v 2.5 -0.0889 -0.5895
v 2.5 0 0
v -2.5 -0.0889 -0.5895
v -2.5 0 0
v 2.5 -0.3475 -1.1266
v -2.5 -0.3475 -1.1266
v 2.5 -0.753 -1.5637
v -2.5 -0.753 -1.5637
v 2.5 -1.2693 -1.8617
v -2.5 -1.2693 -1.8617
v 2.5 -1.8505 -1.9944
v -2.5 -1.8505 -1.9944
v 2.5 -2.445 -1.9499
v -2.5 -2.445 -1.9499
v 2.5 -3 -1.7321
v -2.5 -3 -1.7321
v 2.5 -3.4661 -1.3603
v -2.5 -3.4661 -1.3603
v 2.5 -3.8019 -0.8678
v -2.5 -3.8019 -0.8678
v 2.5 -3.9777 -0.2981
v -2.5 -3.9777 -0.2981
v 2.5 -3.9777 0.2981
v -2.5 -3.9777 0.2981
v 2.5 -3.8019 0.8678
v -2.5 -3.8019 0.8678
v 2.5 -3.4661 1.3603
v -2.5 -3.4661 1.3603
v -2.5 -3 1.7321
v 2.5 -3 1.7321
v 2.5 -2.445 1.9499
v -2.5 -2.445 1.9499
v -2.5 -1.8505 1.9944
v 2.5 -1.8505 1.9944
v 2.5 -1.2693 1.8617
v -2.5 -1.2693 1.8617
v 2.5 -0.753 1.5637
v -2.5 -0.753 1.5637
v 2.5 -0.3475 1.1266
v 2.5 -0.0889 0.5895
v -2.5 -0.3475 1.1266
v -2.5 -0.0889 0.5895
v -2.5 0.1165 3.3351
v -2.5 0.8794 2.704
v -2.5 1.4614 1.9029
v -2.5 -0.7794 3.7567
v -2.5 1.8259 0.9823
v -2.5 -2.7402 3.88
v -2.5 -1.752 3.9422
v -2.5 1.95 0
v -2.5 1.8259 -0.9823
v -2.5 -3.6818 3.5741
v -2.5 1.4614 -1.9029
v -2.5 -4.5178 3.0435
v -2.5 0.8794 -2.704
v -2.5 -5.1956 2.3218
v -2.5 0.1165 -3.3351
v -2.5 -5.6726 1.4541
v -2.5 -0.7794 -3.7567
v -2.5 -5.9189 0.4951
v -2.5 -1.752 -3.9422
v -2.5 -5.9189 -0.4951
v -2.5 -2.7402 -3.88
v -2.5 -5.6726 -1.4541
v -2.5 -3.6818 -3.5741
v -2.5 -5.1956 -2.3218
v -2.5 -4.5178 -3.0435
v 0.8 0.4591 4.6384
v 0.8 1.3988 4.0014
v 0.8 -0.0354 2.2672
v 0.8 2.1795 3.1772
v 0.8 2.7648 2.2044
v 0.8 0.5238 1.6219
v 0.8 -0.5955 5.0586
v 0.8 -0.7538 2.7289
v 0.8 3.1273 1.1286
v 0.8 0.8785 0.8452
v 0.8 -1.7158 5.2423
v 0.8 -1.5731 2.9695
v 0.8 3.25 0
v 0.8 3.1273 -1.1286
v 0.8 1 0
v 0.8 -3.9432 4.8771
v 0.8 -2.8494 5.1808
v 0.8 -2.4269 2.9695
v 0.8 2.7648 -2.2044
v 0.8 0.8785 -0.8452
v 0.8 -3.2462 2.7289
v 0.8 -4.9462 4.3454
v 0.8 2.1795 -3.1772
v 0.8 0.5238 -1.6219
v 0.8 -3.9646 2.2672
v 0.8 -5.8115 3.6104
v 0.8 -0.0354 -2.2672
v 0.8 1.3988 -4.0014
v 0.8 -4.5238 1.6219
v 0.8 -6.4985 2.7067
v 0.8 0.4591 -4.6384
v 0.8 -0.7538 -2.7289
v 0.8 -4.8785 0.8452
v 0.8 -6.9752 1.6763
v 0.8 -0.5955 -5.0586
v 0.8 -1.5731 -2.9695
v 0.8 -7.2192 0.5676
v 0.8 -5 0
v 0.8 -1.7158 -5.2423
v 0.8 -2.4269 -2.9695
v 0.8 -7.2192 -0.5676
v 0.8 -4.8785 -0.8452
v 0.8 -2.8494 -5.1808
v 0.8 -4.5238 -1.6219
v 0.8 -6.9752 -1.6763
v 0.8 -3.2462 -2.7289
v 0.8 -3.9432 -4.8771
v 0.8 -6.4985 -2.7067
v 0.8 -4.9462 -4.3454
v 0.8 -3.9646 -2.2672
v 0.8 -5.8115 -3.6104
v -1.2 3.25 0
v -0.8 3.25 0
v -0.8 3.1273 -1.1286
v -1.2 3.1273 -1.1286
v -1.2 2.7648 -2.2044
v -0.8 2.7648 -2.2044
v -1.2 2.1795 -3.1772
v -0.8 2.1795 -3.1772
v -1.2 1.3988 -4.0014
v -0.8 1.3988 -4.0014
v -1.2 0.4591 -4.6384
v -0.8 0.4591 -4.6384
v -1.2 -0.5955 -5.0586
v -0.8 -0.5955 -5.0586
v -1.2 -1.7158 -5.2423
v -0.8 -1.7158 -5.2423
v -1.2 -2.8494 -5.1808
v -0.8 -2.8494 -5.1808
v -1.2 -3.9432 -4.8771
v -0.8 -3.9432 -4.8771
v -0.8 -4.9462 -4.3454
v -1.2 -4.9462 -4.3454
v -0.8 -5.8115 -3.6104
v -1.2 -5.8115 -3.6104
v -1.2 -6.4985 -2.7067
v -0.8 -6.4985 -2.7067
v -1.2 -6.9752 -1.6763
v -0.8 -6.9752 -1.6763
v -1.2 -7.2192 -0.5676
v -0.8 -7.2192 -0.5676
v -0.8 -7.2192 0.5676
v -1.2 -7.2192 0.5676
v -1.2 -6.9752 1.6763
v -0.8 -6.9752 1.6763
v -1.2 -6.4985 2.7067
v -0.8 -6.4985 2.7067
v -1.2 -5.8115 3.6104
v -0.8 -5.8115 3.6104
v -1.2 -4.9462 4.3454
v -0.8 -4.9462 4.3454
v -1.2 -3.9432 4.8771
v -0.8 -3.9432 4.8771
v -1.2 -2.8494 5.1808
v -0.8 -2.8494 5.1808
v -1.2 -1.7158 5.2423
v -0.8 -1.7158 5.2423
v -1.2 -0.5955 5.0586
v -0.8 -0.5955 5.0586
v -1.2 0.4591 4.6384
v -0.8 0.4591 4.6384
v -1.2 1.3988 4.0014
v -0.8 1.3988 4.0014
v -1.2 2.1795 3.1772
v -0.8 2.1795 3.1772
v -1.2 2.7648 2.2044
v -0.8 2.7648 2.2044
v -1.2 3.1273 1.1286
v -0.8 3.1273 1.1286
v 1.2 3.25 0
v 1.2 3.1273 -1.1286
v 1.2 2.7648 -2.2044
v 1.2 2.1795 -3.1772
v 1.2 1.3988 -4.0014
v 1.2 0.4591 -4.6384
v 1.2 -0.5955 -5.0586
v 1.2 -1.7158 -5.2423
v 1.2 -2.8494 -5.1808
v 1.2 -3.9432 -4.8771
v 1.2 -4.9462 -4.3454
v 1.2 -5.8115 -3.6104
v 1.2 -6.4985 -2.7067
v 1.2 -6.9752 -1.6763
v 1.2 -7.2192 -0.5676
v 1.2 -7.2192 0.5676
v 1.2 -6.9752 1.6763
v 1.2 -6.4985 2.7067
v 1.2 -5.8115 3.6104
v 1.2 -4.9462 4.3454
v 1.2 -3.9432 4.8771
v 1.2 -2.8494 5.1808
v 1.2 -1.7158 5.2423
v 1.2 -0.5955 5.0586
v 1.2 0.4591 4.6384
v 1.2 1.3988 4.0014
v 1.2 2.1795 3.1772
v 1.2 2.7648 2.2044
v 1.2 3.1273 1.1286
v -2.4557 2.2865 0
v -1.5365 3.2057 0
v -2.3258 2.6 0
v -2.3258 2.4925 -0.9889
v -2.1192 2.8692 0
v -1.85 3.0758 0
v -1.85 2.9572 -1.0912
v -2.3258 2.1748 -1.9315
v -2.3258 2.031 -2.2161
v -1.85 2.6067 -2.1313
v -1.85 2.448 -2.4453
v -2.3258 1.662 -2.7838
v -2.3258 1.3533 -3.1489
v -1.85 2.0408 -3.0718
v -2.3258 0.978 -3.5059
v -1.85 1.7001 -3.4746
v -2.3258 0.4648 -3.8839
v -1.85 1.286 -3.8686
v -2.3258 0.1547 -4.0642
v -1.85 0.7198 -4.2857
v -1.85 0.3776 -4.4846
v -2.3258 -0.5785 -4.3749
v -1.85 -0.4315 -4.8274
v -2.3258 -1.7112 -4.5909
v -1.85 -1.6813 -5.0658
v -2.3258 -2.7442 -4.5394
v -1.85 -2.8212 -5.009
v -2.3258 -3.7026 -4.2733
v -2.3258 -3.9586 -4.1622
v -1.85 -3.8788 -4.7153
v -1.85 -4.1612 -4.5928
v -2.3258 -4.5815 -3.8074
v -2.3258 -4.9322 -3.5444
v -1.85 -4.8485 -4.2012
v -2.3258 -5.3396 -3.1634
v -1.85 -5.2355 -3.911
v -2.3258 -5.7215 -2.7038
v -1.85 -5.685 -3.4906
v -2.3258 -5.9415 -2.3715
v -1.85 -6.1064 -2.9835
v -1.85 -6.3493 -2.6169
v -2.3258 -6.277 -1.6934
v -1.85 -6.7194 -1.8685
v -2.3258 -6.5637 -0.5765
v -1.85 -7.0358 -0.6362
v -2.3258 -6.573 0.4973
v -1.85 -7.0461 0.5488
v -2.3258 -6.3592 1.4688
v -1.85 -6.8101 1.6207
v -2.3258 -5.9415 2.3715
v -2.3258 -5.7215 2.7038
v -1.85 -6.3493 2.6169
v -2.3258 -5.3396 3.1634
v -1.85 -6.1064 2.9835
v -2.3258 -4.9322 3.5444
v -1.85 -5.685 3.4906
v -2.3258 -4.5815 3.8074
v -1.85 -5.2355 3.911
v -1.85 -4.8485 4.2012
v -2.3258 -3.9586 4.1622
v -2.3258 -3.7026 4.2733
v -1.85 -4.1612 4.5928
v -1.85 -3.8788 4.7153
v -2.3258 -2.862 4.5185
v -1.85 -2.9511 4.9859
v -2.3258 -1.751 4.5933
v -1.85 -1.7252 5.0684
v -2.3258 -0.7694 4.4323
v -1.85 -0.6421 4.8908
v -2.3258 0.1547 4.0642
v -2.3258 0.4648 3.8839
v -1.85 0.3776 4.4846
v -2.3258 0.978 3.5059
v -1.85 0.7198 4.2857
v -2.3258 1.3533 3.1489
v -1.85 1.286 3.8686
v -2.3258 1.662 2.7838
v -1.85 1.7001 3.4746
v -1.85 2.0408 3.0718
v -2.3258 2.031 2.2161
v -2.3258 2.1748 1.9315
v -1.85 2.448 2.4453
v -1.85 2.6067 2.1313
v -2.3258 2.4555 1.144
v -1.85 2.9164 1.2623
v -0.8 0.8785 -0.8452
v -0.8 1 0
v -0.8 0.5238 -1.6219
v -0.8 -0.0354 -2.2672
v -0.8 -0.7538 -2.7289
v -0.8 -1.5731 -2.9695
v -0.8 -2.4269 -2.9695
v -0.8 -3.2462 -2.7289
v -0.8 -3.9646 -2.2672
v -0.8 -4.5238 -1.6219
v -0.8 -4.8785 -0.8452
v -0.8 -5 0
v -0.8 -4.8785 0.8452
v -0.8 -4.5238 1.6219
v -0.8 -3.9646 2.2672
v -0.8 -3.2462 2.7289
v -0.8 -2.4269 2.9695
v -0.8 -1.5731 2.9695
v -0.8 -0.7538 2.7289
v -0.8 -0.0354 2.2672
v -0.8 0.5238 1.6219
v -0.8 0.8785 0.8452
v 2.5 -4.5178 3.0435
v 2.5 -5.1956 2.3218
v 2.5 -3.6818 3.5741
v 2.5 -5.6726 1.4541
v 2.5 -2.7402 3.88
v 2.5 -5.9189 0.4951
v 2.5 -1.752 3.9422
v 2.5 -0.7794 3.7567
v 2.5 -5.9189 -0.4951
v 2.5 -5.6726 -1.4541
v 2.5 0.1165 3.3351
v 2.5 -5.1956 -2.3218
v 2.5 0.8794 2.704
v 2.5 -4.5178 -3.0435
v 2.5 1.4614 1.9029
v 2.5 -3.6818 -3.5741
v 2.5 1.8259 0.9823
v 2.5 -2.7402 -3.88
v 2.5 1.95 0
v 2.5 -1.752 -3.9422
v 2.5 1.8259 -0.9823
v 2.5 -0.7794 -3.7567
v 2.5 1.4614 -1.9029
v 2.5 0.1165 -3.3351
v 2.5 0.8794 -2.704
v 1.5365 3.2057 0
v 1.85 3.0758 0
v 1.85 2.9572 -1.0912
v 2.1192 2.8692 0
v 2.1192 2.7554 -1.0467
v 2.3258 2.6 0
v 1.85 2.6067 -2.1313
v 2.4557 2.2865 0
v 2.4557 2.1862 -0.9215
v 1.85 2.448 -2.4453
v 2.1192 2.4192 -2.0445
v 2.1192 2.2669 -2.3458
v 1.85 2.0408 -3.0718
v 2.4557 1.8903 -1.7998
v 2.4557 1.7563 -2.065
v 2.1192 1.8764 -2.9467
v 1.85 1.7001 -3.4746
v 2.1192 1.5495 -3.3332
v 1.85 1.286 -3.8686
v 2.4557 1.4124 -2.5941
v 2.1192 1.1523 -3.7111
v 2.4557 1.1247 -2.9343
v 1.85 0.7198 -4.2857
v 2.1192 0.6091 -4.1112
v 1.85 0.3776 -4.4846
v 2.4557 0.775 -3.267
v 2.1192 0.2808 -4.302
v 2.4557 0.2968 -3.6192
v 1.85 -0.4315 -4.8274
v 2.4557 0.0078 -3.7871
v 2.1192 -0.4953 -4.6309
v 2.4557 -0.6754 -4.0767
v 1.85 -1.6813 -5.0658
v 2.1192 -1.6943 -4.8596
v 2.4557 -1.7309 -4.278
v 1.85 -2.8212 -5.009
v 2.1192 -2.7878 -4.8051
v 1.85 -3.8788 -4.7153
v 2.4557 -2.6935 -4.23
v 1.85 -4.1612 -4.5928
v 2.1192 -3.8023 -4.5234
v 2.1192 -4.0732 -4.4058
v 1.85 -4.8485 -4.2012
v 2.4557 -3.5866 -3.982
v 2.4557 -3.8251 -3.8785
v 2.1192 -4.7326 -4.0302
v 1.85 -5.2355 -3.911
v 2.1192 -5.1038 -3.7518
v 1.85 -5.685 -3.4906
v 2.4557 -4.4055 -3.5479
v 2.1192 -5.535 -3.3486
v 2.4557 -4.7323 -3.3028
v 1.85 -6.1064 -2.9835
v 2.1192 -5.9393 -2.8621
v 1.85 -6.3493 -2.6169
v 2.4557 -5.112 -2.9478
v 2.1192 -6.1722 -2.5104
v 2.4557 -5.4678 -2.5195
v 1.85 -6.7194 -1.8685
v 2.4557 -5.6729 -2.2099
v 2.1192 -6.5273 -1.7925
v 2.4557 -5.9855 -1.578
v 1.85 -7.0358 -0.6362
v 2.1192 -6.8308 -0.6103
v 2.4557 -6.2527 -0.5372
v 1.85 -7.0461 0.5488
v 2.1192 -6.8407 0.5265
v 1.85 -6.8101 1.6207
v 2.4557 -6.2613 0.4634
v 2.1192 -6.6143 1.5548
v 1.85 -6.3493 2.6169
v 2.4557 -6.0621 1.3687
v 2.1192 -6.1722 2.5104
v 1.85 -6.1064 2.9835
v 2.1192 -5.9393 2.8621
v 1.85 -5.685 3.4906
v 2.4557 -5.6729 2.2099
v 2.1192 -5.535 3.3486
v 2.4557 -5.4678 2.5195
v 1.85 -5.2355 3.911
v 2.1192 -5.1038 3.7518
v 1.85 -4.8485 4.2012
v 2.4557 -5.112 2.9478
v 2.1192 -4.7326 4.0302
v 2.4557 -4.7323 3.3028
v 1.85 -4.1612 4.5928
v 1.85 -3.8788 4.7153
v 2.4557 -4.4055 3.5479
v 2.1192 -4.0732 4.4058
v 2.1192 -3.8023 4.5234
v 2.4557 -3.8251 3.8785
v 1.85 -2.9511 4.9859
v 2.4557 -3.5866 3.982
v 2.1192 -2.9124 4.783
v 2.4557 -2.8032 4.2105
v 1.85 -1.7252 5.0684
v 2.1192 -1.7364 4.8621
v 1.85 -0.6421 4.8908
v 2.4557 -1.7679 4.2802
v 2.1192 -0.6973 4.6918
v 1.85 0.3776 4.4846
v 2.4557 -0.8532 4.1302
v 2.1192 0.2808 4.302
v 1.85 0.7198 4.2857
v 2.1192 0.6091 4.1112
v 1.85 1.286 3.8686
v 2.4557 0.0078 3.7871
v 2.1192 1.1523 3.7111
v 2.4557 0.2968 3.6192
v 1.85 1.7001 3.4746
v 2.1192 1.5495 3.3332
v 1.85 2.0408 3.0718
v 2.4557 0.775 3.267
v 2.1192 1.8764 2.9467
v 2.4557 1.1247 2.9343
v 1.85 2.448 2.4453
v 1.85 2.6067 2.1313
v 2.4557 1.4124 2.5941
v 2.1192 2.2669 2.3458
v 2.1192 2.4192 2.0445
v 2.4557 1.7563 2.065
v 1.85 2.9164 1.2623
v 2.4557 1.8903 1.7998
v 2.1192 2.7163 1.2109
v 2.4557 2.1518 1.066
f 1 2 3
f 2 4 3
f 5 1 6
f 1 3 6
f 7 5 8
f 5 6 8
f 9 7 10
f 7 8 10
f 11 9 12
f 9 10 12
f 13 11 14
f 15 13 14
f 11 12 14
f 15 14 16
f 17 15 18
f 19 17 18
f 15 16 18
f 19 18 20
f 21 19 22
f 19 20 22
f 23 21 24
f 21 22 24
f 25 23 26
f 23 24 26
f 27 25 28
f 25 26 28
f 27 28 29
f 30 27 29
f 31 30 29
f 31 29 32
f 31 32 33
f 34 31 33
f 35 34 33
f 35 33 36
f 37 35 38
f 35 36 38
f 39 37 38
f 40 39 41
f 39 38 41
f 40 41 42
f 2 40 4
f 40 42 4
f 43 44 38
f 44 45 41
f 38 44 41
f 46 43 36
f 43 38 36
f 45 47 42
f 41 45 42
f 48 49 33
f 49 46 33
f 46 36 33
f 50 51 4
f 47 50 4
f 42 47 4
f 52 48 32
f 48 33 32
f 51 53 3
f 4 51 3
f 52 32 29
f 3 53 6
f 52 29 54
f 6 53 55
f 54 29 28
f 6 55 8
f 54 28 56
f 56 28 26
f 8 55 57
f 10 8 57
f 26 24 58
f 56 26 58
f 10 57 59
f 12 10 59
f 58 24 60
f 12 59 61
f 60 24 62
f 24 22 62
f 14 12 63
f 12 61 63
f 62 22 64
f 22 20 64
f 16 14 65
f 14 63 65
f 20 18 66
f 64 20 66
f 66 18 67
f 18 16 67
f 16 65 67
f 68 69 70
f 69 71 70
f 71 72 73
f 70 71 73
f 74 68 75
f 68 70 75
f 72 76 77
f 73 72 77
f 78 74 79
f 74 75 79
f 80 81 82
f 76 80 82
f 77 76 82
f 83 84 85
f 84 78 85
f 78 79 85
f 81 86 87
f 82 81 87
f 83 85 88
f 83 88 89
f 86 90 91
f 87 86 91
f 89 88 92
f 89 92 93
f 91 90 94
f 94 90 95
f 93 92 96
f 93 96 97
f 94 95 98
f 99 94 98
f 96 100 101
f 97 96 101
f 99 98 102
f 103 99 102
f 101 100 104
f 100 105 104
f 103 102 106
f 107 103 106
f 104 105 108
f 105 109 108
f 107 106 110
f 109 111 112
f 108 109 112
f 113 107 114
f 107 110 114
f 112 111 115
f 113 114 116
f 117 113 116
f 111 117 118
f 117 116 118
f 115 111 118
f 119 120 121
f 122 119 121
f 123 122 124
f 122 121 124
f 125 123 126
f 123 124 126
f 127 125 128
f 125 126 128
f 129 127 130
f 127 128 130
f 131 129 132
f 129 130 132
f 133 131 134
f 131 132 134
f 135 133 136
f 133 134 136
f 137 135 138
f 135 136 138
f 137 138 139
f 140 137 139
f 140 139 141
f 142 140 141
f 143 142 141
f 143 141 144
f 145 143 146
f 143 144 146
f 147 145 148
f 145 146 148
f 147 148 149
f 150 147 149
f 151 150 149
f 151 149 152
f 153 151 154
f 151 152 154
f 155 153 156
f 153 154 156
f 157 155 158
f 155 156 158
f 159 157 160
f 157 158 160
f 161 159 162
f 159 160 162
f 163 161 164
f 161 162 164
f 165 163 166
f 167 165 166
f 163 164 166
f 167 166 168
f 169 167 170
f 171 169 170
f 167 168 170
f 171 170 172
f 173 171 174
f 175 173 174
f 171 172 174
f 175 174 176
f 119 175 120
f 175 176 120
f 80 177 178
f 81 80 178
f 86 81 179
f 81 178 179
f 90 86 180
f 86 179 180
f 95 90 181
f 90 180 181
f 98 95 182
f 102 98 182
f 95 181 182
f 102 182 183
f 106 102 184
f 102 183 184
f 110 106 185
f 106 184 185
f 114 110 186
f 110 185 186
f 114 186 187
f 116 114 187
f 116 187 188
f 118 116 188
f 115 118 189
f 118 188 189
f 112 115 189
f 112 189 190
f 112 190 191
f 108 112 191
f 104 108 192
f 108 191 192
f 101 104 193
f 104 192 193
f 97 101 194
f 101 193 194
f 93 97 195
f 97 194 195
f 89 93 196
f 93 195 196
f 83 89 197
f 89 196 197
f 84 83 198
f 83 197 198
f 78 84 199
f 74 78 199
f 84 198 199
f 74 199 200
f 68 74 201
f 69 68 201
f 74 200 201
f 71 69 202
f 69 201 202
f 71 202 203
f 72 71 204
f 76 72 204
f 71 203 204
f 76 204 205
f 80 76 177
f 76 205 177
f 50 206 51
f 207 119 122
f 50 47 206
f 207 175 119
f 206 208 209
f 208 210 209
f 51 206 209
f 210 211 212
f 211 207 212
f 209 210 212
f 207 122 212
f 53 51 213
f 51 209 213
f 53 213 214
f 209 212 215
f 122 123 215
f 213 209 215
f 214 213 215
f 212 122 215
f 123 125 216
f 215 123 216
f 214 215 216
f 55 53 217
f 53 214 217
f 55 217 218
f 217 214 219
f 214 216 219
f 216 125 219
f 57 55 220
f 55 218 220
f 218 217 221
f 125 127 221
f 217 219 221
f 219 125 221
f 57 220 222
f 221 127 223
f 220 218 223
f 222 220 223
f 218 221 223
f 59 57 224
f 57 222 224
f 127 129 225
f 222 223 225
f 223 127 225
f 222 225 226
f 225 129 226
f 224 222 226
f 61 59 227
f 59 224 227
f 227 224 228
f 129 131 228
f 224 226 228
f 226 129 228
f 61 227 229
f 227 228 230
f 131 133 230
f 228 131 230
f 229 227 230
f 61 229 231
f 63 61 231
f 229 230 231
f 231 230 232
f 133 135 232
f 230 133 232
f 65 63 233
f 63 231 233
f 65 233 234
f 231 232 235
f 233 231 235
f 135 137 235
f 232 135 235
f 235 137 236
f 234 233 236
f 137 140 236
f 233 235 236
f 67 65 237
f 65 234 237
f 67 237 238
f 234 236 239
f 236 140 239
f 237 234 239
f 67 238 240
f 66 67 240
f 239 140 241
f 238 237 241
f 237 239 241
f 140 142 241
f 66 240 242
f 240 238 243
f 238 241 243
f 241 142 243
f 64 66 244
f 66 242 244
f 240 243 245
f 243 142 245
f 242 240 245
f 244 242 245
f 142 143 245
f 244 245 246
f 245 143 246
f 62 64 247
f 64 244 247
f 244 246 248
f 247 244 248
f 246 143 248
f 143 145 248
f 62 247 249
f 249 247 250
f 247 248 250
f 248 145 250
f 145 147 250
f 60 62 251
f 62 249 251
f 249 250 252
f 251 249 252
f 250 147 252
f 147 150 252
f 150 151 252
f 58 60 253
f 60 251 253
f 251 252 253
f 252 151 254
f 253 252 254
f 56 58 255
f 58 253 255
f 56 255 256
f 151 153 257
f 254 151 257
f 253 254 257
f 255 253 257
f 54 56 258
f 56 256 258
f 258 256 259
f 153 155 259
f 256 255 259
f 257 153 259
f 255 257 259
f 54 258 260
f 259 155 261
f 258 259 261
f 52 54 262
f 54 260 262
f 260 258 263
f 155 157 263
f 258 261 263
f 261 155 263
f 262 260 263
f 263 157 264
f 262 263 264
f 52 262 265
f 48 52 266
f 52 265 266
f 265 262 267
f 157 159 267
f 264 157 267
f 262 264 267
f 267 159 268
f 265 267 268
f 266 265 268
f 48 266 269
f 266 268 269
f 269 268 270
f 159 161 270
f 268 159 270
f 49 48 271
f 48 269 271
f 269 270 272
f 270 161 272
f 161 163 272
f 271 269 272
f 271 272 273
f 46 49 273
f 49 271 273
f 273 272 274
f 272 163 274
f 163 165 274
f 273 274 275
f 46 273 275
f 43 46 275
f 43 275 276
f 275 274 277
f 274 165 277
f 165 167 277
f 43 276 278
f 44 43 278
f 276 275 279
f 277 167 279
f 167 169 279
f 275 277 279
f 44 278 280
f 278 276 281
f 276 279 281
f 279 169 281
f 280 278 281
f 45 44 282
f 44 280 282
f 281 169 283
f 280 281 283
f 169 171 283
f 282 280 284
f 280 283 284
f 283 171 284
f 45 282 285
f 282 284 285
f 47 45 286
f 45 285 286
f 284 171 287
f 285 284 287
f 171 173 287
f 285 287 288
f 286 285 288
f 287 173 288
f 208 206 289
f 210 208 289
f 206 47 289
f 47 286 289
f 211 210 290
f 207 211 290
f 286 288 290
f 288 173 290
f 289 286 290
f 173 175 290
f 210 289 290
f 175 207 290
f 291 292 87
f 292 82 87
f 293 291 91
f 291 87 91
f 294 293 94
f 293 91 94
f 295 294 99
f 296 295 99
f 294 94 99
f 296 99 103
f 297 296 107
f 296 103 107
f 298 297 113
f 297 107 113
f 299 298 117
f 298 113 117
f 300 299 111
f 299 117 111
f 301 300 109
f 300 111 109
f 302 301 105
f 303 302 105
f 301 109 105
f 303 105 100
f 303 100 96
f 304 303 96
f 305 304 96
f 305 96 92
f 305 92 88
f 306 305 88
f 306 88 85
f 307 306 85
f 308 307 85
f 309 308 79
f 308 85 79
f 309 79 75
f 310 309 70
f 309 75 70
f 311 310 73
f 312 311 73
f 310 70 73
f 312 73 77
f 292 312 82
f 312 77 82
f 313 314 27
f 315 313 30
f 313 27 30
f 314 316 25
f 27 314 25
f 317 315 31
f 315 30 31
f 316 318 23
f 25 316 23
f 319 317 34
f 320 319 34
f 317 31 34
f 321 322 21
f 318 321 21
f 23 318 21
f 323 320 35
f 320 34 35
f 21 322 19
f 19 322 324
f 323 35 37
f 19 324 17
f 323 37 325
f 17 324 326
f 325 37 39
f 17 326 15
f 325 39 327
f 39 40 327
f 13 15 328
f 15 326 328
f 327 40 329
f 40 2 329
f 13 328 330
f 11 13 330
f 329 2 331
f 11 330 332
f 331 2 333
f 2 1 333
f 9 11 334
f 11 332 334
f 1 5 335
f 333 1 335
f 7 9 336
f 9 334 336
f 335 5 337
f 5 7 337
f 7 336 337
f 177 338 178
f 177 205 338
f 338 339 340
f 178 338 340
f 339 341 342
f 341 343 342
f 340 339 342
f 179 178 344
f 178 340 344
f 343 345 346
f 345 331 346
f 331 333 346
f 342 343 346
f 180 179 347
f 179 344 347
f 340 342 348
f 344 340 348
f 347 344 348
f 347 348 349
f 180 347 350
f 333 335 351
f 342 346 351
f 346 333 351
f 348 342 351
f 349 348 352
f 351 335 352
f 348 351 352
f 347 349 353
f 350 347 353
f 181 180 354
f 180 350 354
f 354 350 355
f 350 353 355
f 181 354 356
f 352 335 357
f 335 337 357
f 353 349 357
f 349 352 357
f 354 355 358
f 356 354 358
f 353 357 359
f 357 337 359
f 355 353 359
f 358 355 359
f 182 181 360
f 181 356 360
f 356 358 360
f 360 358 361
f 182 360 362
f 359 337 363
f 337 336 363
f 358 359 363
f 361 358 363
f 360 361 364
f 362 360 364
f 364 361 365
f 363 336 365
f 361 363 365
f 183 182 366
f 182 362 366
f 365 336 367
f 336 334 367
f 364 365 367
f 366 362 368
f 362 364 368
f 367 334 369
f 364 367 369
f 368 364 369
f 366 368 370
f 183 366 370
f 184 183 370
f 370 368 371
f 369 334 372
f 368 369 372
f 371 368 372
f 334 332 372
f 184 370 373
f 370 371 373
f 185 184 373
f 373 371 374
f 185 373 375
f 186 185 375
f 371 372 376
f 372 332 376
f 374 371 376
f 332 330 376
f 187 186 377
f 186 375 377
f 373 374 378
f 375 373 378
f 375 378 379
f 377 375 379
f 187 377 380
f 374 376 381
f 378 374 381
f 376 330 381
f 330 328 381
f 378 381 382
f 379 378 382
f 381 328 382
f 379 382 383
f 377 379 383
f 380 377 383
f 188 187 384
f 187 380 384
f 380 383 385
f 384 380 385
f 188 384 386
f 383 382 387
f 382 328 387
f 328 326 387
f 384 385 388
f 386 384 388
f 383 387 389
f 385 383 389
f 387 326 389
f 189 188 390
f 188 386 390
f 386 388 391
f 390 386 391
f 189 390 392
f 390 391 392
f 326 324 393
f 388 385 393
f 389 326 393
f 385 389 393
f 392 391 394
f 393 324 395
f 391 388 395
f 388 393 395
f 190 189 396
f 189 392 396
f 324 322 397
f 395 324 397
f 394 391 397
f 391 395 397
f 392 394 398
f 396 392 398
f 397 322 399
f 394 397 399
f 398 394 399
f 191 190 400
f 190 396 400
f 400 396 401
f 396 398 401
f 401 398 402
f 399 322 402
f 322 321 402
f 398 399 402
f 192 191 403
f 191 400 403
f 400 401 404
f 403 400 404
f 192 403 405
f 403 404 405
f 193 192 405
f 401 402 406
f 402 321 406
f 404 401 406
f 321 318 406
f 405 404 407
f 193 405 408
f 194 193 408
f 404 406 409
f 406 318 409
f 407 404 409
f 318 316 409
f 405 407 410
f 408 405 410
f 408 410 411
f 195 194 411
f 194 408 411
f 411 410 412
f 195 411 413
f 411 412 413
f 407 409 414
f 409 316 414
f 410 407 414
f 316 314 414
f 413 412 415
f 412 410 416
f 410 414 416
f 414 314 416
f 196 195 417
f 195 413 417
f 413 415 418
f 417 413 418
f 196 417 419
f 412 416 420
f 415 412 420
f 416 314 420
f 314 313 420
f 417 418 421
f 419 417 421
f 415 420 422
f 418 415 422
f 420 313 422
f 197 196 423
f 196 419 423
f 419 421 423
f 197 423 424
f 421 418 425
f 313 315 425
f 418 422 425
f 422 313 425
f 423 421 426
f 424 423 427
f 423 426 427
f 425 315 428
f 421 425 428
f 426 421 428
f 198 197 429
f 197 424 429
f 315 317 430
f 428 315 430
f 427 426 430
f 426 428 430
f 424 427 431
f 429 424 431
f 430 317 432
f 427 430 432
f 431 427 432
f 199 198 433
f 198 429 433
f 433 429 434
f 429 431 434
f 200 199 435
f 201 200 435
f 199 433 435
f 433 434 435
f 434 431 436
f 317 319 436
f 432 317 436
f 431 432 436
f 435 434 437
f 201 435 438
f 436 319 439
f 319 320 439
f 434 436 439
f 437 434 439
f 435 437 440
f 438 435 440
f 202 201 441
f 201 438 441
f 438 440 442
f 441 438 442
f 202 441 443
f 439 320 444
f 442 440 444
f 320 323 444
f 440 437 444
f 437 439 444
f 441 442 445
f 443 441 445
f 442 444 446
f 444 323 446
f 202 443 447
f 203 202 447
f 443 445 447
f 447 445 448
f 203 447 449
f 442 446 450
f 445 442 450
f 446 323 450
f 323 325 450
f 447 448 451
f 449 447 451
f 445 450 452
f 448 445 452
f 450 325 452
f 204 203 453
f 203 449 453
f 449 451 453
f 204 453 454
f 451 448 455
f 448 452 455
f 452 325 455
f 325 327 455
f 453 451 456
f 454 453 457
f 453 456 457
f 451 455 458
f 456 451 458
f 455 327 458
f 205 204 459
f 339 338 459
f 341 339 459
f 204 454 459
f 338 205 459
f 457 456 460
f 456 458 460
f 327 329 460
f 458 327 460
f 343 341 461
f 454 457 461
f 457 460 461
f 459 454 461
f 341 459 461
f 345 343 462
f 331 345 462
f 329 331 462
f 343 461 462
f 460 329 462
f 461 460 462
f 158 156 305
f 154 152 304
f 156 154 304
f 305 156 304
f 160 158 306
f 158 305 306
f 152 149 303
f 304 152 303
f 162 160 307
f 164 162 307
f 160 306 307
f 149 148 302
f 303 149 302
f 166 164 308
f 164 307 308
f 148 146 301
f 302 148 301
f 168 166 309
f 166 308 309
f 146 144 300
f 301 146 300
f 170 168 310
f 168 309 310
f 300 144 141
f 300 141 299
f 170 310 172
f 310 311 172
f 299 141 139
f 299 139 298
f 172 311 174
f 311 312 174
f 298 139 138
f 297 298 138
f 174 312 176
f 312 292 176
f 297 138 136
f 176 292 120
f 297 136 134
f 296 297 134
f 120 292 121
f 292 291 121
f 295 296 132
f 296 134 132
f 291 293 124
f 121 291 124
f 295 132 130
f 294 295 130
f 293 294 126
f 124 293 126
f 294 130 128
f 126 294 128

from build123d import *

# Parameters (mm, degrees)
FILLET_1_R = 1.3


with BuildPart() as part:
    # Эскиз1 → Повернуть1 (revolve)
    with BuildSketch(Plane.XY):
        Polygon((-0.8, 1), (0.8, 1), (0.8, 3.25), (2.5, 3.25), (2.5, 0), (-2.5, 0), (-2.5, 3.25), (-0.8, 3.25), align=None)
    revolve(axis=Axis((0, -2, 0), (-1, 0, 0)))

    # Скругление1
    fillet_1_edges = [part.edges().sort_by_distance(p)[0] for p in [
        (2.5, -7.25, 0),
        (-2.5, -7.25, 0),
    ]]
    fillet(fillet_1_edges, radius=FILLET_1_R)


solid = part.part
